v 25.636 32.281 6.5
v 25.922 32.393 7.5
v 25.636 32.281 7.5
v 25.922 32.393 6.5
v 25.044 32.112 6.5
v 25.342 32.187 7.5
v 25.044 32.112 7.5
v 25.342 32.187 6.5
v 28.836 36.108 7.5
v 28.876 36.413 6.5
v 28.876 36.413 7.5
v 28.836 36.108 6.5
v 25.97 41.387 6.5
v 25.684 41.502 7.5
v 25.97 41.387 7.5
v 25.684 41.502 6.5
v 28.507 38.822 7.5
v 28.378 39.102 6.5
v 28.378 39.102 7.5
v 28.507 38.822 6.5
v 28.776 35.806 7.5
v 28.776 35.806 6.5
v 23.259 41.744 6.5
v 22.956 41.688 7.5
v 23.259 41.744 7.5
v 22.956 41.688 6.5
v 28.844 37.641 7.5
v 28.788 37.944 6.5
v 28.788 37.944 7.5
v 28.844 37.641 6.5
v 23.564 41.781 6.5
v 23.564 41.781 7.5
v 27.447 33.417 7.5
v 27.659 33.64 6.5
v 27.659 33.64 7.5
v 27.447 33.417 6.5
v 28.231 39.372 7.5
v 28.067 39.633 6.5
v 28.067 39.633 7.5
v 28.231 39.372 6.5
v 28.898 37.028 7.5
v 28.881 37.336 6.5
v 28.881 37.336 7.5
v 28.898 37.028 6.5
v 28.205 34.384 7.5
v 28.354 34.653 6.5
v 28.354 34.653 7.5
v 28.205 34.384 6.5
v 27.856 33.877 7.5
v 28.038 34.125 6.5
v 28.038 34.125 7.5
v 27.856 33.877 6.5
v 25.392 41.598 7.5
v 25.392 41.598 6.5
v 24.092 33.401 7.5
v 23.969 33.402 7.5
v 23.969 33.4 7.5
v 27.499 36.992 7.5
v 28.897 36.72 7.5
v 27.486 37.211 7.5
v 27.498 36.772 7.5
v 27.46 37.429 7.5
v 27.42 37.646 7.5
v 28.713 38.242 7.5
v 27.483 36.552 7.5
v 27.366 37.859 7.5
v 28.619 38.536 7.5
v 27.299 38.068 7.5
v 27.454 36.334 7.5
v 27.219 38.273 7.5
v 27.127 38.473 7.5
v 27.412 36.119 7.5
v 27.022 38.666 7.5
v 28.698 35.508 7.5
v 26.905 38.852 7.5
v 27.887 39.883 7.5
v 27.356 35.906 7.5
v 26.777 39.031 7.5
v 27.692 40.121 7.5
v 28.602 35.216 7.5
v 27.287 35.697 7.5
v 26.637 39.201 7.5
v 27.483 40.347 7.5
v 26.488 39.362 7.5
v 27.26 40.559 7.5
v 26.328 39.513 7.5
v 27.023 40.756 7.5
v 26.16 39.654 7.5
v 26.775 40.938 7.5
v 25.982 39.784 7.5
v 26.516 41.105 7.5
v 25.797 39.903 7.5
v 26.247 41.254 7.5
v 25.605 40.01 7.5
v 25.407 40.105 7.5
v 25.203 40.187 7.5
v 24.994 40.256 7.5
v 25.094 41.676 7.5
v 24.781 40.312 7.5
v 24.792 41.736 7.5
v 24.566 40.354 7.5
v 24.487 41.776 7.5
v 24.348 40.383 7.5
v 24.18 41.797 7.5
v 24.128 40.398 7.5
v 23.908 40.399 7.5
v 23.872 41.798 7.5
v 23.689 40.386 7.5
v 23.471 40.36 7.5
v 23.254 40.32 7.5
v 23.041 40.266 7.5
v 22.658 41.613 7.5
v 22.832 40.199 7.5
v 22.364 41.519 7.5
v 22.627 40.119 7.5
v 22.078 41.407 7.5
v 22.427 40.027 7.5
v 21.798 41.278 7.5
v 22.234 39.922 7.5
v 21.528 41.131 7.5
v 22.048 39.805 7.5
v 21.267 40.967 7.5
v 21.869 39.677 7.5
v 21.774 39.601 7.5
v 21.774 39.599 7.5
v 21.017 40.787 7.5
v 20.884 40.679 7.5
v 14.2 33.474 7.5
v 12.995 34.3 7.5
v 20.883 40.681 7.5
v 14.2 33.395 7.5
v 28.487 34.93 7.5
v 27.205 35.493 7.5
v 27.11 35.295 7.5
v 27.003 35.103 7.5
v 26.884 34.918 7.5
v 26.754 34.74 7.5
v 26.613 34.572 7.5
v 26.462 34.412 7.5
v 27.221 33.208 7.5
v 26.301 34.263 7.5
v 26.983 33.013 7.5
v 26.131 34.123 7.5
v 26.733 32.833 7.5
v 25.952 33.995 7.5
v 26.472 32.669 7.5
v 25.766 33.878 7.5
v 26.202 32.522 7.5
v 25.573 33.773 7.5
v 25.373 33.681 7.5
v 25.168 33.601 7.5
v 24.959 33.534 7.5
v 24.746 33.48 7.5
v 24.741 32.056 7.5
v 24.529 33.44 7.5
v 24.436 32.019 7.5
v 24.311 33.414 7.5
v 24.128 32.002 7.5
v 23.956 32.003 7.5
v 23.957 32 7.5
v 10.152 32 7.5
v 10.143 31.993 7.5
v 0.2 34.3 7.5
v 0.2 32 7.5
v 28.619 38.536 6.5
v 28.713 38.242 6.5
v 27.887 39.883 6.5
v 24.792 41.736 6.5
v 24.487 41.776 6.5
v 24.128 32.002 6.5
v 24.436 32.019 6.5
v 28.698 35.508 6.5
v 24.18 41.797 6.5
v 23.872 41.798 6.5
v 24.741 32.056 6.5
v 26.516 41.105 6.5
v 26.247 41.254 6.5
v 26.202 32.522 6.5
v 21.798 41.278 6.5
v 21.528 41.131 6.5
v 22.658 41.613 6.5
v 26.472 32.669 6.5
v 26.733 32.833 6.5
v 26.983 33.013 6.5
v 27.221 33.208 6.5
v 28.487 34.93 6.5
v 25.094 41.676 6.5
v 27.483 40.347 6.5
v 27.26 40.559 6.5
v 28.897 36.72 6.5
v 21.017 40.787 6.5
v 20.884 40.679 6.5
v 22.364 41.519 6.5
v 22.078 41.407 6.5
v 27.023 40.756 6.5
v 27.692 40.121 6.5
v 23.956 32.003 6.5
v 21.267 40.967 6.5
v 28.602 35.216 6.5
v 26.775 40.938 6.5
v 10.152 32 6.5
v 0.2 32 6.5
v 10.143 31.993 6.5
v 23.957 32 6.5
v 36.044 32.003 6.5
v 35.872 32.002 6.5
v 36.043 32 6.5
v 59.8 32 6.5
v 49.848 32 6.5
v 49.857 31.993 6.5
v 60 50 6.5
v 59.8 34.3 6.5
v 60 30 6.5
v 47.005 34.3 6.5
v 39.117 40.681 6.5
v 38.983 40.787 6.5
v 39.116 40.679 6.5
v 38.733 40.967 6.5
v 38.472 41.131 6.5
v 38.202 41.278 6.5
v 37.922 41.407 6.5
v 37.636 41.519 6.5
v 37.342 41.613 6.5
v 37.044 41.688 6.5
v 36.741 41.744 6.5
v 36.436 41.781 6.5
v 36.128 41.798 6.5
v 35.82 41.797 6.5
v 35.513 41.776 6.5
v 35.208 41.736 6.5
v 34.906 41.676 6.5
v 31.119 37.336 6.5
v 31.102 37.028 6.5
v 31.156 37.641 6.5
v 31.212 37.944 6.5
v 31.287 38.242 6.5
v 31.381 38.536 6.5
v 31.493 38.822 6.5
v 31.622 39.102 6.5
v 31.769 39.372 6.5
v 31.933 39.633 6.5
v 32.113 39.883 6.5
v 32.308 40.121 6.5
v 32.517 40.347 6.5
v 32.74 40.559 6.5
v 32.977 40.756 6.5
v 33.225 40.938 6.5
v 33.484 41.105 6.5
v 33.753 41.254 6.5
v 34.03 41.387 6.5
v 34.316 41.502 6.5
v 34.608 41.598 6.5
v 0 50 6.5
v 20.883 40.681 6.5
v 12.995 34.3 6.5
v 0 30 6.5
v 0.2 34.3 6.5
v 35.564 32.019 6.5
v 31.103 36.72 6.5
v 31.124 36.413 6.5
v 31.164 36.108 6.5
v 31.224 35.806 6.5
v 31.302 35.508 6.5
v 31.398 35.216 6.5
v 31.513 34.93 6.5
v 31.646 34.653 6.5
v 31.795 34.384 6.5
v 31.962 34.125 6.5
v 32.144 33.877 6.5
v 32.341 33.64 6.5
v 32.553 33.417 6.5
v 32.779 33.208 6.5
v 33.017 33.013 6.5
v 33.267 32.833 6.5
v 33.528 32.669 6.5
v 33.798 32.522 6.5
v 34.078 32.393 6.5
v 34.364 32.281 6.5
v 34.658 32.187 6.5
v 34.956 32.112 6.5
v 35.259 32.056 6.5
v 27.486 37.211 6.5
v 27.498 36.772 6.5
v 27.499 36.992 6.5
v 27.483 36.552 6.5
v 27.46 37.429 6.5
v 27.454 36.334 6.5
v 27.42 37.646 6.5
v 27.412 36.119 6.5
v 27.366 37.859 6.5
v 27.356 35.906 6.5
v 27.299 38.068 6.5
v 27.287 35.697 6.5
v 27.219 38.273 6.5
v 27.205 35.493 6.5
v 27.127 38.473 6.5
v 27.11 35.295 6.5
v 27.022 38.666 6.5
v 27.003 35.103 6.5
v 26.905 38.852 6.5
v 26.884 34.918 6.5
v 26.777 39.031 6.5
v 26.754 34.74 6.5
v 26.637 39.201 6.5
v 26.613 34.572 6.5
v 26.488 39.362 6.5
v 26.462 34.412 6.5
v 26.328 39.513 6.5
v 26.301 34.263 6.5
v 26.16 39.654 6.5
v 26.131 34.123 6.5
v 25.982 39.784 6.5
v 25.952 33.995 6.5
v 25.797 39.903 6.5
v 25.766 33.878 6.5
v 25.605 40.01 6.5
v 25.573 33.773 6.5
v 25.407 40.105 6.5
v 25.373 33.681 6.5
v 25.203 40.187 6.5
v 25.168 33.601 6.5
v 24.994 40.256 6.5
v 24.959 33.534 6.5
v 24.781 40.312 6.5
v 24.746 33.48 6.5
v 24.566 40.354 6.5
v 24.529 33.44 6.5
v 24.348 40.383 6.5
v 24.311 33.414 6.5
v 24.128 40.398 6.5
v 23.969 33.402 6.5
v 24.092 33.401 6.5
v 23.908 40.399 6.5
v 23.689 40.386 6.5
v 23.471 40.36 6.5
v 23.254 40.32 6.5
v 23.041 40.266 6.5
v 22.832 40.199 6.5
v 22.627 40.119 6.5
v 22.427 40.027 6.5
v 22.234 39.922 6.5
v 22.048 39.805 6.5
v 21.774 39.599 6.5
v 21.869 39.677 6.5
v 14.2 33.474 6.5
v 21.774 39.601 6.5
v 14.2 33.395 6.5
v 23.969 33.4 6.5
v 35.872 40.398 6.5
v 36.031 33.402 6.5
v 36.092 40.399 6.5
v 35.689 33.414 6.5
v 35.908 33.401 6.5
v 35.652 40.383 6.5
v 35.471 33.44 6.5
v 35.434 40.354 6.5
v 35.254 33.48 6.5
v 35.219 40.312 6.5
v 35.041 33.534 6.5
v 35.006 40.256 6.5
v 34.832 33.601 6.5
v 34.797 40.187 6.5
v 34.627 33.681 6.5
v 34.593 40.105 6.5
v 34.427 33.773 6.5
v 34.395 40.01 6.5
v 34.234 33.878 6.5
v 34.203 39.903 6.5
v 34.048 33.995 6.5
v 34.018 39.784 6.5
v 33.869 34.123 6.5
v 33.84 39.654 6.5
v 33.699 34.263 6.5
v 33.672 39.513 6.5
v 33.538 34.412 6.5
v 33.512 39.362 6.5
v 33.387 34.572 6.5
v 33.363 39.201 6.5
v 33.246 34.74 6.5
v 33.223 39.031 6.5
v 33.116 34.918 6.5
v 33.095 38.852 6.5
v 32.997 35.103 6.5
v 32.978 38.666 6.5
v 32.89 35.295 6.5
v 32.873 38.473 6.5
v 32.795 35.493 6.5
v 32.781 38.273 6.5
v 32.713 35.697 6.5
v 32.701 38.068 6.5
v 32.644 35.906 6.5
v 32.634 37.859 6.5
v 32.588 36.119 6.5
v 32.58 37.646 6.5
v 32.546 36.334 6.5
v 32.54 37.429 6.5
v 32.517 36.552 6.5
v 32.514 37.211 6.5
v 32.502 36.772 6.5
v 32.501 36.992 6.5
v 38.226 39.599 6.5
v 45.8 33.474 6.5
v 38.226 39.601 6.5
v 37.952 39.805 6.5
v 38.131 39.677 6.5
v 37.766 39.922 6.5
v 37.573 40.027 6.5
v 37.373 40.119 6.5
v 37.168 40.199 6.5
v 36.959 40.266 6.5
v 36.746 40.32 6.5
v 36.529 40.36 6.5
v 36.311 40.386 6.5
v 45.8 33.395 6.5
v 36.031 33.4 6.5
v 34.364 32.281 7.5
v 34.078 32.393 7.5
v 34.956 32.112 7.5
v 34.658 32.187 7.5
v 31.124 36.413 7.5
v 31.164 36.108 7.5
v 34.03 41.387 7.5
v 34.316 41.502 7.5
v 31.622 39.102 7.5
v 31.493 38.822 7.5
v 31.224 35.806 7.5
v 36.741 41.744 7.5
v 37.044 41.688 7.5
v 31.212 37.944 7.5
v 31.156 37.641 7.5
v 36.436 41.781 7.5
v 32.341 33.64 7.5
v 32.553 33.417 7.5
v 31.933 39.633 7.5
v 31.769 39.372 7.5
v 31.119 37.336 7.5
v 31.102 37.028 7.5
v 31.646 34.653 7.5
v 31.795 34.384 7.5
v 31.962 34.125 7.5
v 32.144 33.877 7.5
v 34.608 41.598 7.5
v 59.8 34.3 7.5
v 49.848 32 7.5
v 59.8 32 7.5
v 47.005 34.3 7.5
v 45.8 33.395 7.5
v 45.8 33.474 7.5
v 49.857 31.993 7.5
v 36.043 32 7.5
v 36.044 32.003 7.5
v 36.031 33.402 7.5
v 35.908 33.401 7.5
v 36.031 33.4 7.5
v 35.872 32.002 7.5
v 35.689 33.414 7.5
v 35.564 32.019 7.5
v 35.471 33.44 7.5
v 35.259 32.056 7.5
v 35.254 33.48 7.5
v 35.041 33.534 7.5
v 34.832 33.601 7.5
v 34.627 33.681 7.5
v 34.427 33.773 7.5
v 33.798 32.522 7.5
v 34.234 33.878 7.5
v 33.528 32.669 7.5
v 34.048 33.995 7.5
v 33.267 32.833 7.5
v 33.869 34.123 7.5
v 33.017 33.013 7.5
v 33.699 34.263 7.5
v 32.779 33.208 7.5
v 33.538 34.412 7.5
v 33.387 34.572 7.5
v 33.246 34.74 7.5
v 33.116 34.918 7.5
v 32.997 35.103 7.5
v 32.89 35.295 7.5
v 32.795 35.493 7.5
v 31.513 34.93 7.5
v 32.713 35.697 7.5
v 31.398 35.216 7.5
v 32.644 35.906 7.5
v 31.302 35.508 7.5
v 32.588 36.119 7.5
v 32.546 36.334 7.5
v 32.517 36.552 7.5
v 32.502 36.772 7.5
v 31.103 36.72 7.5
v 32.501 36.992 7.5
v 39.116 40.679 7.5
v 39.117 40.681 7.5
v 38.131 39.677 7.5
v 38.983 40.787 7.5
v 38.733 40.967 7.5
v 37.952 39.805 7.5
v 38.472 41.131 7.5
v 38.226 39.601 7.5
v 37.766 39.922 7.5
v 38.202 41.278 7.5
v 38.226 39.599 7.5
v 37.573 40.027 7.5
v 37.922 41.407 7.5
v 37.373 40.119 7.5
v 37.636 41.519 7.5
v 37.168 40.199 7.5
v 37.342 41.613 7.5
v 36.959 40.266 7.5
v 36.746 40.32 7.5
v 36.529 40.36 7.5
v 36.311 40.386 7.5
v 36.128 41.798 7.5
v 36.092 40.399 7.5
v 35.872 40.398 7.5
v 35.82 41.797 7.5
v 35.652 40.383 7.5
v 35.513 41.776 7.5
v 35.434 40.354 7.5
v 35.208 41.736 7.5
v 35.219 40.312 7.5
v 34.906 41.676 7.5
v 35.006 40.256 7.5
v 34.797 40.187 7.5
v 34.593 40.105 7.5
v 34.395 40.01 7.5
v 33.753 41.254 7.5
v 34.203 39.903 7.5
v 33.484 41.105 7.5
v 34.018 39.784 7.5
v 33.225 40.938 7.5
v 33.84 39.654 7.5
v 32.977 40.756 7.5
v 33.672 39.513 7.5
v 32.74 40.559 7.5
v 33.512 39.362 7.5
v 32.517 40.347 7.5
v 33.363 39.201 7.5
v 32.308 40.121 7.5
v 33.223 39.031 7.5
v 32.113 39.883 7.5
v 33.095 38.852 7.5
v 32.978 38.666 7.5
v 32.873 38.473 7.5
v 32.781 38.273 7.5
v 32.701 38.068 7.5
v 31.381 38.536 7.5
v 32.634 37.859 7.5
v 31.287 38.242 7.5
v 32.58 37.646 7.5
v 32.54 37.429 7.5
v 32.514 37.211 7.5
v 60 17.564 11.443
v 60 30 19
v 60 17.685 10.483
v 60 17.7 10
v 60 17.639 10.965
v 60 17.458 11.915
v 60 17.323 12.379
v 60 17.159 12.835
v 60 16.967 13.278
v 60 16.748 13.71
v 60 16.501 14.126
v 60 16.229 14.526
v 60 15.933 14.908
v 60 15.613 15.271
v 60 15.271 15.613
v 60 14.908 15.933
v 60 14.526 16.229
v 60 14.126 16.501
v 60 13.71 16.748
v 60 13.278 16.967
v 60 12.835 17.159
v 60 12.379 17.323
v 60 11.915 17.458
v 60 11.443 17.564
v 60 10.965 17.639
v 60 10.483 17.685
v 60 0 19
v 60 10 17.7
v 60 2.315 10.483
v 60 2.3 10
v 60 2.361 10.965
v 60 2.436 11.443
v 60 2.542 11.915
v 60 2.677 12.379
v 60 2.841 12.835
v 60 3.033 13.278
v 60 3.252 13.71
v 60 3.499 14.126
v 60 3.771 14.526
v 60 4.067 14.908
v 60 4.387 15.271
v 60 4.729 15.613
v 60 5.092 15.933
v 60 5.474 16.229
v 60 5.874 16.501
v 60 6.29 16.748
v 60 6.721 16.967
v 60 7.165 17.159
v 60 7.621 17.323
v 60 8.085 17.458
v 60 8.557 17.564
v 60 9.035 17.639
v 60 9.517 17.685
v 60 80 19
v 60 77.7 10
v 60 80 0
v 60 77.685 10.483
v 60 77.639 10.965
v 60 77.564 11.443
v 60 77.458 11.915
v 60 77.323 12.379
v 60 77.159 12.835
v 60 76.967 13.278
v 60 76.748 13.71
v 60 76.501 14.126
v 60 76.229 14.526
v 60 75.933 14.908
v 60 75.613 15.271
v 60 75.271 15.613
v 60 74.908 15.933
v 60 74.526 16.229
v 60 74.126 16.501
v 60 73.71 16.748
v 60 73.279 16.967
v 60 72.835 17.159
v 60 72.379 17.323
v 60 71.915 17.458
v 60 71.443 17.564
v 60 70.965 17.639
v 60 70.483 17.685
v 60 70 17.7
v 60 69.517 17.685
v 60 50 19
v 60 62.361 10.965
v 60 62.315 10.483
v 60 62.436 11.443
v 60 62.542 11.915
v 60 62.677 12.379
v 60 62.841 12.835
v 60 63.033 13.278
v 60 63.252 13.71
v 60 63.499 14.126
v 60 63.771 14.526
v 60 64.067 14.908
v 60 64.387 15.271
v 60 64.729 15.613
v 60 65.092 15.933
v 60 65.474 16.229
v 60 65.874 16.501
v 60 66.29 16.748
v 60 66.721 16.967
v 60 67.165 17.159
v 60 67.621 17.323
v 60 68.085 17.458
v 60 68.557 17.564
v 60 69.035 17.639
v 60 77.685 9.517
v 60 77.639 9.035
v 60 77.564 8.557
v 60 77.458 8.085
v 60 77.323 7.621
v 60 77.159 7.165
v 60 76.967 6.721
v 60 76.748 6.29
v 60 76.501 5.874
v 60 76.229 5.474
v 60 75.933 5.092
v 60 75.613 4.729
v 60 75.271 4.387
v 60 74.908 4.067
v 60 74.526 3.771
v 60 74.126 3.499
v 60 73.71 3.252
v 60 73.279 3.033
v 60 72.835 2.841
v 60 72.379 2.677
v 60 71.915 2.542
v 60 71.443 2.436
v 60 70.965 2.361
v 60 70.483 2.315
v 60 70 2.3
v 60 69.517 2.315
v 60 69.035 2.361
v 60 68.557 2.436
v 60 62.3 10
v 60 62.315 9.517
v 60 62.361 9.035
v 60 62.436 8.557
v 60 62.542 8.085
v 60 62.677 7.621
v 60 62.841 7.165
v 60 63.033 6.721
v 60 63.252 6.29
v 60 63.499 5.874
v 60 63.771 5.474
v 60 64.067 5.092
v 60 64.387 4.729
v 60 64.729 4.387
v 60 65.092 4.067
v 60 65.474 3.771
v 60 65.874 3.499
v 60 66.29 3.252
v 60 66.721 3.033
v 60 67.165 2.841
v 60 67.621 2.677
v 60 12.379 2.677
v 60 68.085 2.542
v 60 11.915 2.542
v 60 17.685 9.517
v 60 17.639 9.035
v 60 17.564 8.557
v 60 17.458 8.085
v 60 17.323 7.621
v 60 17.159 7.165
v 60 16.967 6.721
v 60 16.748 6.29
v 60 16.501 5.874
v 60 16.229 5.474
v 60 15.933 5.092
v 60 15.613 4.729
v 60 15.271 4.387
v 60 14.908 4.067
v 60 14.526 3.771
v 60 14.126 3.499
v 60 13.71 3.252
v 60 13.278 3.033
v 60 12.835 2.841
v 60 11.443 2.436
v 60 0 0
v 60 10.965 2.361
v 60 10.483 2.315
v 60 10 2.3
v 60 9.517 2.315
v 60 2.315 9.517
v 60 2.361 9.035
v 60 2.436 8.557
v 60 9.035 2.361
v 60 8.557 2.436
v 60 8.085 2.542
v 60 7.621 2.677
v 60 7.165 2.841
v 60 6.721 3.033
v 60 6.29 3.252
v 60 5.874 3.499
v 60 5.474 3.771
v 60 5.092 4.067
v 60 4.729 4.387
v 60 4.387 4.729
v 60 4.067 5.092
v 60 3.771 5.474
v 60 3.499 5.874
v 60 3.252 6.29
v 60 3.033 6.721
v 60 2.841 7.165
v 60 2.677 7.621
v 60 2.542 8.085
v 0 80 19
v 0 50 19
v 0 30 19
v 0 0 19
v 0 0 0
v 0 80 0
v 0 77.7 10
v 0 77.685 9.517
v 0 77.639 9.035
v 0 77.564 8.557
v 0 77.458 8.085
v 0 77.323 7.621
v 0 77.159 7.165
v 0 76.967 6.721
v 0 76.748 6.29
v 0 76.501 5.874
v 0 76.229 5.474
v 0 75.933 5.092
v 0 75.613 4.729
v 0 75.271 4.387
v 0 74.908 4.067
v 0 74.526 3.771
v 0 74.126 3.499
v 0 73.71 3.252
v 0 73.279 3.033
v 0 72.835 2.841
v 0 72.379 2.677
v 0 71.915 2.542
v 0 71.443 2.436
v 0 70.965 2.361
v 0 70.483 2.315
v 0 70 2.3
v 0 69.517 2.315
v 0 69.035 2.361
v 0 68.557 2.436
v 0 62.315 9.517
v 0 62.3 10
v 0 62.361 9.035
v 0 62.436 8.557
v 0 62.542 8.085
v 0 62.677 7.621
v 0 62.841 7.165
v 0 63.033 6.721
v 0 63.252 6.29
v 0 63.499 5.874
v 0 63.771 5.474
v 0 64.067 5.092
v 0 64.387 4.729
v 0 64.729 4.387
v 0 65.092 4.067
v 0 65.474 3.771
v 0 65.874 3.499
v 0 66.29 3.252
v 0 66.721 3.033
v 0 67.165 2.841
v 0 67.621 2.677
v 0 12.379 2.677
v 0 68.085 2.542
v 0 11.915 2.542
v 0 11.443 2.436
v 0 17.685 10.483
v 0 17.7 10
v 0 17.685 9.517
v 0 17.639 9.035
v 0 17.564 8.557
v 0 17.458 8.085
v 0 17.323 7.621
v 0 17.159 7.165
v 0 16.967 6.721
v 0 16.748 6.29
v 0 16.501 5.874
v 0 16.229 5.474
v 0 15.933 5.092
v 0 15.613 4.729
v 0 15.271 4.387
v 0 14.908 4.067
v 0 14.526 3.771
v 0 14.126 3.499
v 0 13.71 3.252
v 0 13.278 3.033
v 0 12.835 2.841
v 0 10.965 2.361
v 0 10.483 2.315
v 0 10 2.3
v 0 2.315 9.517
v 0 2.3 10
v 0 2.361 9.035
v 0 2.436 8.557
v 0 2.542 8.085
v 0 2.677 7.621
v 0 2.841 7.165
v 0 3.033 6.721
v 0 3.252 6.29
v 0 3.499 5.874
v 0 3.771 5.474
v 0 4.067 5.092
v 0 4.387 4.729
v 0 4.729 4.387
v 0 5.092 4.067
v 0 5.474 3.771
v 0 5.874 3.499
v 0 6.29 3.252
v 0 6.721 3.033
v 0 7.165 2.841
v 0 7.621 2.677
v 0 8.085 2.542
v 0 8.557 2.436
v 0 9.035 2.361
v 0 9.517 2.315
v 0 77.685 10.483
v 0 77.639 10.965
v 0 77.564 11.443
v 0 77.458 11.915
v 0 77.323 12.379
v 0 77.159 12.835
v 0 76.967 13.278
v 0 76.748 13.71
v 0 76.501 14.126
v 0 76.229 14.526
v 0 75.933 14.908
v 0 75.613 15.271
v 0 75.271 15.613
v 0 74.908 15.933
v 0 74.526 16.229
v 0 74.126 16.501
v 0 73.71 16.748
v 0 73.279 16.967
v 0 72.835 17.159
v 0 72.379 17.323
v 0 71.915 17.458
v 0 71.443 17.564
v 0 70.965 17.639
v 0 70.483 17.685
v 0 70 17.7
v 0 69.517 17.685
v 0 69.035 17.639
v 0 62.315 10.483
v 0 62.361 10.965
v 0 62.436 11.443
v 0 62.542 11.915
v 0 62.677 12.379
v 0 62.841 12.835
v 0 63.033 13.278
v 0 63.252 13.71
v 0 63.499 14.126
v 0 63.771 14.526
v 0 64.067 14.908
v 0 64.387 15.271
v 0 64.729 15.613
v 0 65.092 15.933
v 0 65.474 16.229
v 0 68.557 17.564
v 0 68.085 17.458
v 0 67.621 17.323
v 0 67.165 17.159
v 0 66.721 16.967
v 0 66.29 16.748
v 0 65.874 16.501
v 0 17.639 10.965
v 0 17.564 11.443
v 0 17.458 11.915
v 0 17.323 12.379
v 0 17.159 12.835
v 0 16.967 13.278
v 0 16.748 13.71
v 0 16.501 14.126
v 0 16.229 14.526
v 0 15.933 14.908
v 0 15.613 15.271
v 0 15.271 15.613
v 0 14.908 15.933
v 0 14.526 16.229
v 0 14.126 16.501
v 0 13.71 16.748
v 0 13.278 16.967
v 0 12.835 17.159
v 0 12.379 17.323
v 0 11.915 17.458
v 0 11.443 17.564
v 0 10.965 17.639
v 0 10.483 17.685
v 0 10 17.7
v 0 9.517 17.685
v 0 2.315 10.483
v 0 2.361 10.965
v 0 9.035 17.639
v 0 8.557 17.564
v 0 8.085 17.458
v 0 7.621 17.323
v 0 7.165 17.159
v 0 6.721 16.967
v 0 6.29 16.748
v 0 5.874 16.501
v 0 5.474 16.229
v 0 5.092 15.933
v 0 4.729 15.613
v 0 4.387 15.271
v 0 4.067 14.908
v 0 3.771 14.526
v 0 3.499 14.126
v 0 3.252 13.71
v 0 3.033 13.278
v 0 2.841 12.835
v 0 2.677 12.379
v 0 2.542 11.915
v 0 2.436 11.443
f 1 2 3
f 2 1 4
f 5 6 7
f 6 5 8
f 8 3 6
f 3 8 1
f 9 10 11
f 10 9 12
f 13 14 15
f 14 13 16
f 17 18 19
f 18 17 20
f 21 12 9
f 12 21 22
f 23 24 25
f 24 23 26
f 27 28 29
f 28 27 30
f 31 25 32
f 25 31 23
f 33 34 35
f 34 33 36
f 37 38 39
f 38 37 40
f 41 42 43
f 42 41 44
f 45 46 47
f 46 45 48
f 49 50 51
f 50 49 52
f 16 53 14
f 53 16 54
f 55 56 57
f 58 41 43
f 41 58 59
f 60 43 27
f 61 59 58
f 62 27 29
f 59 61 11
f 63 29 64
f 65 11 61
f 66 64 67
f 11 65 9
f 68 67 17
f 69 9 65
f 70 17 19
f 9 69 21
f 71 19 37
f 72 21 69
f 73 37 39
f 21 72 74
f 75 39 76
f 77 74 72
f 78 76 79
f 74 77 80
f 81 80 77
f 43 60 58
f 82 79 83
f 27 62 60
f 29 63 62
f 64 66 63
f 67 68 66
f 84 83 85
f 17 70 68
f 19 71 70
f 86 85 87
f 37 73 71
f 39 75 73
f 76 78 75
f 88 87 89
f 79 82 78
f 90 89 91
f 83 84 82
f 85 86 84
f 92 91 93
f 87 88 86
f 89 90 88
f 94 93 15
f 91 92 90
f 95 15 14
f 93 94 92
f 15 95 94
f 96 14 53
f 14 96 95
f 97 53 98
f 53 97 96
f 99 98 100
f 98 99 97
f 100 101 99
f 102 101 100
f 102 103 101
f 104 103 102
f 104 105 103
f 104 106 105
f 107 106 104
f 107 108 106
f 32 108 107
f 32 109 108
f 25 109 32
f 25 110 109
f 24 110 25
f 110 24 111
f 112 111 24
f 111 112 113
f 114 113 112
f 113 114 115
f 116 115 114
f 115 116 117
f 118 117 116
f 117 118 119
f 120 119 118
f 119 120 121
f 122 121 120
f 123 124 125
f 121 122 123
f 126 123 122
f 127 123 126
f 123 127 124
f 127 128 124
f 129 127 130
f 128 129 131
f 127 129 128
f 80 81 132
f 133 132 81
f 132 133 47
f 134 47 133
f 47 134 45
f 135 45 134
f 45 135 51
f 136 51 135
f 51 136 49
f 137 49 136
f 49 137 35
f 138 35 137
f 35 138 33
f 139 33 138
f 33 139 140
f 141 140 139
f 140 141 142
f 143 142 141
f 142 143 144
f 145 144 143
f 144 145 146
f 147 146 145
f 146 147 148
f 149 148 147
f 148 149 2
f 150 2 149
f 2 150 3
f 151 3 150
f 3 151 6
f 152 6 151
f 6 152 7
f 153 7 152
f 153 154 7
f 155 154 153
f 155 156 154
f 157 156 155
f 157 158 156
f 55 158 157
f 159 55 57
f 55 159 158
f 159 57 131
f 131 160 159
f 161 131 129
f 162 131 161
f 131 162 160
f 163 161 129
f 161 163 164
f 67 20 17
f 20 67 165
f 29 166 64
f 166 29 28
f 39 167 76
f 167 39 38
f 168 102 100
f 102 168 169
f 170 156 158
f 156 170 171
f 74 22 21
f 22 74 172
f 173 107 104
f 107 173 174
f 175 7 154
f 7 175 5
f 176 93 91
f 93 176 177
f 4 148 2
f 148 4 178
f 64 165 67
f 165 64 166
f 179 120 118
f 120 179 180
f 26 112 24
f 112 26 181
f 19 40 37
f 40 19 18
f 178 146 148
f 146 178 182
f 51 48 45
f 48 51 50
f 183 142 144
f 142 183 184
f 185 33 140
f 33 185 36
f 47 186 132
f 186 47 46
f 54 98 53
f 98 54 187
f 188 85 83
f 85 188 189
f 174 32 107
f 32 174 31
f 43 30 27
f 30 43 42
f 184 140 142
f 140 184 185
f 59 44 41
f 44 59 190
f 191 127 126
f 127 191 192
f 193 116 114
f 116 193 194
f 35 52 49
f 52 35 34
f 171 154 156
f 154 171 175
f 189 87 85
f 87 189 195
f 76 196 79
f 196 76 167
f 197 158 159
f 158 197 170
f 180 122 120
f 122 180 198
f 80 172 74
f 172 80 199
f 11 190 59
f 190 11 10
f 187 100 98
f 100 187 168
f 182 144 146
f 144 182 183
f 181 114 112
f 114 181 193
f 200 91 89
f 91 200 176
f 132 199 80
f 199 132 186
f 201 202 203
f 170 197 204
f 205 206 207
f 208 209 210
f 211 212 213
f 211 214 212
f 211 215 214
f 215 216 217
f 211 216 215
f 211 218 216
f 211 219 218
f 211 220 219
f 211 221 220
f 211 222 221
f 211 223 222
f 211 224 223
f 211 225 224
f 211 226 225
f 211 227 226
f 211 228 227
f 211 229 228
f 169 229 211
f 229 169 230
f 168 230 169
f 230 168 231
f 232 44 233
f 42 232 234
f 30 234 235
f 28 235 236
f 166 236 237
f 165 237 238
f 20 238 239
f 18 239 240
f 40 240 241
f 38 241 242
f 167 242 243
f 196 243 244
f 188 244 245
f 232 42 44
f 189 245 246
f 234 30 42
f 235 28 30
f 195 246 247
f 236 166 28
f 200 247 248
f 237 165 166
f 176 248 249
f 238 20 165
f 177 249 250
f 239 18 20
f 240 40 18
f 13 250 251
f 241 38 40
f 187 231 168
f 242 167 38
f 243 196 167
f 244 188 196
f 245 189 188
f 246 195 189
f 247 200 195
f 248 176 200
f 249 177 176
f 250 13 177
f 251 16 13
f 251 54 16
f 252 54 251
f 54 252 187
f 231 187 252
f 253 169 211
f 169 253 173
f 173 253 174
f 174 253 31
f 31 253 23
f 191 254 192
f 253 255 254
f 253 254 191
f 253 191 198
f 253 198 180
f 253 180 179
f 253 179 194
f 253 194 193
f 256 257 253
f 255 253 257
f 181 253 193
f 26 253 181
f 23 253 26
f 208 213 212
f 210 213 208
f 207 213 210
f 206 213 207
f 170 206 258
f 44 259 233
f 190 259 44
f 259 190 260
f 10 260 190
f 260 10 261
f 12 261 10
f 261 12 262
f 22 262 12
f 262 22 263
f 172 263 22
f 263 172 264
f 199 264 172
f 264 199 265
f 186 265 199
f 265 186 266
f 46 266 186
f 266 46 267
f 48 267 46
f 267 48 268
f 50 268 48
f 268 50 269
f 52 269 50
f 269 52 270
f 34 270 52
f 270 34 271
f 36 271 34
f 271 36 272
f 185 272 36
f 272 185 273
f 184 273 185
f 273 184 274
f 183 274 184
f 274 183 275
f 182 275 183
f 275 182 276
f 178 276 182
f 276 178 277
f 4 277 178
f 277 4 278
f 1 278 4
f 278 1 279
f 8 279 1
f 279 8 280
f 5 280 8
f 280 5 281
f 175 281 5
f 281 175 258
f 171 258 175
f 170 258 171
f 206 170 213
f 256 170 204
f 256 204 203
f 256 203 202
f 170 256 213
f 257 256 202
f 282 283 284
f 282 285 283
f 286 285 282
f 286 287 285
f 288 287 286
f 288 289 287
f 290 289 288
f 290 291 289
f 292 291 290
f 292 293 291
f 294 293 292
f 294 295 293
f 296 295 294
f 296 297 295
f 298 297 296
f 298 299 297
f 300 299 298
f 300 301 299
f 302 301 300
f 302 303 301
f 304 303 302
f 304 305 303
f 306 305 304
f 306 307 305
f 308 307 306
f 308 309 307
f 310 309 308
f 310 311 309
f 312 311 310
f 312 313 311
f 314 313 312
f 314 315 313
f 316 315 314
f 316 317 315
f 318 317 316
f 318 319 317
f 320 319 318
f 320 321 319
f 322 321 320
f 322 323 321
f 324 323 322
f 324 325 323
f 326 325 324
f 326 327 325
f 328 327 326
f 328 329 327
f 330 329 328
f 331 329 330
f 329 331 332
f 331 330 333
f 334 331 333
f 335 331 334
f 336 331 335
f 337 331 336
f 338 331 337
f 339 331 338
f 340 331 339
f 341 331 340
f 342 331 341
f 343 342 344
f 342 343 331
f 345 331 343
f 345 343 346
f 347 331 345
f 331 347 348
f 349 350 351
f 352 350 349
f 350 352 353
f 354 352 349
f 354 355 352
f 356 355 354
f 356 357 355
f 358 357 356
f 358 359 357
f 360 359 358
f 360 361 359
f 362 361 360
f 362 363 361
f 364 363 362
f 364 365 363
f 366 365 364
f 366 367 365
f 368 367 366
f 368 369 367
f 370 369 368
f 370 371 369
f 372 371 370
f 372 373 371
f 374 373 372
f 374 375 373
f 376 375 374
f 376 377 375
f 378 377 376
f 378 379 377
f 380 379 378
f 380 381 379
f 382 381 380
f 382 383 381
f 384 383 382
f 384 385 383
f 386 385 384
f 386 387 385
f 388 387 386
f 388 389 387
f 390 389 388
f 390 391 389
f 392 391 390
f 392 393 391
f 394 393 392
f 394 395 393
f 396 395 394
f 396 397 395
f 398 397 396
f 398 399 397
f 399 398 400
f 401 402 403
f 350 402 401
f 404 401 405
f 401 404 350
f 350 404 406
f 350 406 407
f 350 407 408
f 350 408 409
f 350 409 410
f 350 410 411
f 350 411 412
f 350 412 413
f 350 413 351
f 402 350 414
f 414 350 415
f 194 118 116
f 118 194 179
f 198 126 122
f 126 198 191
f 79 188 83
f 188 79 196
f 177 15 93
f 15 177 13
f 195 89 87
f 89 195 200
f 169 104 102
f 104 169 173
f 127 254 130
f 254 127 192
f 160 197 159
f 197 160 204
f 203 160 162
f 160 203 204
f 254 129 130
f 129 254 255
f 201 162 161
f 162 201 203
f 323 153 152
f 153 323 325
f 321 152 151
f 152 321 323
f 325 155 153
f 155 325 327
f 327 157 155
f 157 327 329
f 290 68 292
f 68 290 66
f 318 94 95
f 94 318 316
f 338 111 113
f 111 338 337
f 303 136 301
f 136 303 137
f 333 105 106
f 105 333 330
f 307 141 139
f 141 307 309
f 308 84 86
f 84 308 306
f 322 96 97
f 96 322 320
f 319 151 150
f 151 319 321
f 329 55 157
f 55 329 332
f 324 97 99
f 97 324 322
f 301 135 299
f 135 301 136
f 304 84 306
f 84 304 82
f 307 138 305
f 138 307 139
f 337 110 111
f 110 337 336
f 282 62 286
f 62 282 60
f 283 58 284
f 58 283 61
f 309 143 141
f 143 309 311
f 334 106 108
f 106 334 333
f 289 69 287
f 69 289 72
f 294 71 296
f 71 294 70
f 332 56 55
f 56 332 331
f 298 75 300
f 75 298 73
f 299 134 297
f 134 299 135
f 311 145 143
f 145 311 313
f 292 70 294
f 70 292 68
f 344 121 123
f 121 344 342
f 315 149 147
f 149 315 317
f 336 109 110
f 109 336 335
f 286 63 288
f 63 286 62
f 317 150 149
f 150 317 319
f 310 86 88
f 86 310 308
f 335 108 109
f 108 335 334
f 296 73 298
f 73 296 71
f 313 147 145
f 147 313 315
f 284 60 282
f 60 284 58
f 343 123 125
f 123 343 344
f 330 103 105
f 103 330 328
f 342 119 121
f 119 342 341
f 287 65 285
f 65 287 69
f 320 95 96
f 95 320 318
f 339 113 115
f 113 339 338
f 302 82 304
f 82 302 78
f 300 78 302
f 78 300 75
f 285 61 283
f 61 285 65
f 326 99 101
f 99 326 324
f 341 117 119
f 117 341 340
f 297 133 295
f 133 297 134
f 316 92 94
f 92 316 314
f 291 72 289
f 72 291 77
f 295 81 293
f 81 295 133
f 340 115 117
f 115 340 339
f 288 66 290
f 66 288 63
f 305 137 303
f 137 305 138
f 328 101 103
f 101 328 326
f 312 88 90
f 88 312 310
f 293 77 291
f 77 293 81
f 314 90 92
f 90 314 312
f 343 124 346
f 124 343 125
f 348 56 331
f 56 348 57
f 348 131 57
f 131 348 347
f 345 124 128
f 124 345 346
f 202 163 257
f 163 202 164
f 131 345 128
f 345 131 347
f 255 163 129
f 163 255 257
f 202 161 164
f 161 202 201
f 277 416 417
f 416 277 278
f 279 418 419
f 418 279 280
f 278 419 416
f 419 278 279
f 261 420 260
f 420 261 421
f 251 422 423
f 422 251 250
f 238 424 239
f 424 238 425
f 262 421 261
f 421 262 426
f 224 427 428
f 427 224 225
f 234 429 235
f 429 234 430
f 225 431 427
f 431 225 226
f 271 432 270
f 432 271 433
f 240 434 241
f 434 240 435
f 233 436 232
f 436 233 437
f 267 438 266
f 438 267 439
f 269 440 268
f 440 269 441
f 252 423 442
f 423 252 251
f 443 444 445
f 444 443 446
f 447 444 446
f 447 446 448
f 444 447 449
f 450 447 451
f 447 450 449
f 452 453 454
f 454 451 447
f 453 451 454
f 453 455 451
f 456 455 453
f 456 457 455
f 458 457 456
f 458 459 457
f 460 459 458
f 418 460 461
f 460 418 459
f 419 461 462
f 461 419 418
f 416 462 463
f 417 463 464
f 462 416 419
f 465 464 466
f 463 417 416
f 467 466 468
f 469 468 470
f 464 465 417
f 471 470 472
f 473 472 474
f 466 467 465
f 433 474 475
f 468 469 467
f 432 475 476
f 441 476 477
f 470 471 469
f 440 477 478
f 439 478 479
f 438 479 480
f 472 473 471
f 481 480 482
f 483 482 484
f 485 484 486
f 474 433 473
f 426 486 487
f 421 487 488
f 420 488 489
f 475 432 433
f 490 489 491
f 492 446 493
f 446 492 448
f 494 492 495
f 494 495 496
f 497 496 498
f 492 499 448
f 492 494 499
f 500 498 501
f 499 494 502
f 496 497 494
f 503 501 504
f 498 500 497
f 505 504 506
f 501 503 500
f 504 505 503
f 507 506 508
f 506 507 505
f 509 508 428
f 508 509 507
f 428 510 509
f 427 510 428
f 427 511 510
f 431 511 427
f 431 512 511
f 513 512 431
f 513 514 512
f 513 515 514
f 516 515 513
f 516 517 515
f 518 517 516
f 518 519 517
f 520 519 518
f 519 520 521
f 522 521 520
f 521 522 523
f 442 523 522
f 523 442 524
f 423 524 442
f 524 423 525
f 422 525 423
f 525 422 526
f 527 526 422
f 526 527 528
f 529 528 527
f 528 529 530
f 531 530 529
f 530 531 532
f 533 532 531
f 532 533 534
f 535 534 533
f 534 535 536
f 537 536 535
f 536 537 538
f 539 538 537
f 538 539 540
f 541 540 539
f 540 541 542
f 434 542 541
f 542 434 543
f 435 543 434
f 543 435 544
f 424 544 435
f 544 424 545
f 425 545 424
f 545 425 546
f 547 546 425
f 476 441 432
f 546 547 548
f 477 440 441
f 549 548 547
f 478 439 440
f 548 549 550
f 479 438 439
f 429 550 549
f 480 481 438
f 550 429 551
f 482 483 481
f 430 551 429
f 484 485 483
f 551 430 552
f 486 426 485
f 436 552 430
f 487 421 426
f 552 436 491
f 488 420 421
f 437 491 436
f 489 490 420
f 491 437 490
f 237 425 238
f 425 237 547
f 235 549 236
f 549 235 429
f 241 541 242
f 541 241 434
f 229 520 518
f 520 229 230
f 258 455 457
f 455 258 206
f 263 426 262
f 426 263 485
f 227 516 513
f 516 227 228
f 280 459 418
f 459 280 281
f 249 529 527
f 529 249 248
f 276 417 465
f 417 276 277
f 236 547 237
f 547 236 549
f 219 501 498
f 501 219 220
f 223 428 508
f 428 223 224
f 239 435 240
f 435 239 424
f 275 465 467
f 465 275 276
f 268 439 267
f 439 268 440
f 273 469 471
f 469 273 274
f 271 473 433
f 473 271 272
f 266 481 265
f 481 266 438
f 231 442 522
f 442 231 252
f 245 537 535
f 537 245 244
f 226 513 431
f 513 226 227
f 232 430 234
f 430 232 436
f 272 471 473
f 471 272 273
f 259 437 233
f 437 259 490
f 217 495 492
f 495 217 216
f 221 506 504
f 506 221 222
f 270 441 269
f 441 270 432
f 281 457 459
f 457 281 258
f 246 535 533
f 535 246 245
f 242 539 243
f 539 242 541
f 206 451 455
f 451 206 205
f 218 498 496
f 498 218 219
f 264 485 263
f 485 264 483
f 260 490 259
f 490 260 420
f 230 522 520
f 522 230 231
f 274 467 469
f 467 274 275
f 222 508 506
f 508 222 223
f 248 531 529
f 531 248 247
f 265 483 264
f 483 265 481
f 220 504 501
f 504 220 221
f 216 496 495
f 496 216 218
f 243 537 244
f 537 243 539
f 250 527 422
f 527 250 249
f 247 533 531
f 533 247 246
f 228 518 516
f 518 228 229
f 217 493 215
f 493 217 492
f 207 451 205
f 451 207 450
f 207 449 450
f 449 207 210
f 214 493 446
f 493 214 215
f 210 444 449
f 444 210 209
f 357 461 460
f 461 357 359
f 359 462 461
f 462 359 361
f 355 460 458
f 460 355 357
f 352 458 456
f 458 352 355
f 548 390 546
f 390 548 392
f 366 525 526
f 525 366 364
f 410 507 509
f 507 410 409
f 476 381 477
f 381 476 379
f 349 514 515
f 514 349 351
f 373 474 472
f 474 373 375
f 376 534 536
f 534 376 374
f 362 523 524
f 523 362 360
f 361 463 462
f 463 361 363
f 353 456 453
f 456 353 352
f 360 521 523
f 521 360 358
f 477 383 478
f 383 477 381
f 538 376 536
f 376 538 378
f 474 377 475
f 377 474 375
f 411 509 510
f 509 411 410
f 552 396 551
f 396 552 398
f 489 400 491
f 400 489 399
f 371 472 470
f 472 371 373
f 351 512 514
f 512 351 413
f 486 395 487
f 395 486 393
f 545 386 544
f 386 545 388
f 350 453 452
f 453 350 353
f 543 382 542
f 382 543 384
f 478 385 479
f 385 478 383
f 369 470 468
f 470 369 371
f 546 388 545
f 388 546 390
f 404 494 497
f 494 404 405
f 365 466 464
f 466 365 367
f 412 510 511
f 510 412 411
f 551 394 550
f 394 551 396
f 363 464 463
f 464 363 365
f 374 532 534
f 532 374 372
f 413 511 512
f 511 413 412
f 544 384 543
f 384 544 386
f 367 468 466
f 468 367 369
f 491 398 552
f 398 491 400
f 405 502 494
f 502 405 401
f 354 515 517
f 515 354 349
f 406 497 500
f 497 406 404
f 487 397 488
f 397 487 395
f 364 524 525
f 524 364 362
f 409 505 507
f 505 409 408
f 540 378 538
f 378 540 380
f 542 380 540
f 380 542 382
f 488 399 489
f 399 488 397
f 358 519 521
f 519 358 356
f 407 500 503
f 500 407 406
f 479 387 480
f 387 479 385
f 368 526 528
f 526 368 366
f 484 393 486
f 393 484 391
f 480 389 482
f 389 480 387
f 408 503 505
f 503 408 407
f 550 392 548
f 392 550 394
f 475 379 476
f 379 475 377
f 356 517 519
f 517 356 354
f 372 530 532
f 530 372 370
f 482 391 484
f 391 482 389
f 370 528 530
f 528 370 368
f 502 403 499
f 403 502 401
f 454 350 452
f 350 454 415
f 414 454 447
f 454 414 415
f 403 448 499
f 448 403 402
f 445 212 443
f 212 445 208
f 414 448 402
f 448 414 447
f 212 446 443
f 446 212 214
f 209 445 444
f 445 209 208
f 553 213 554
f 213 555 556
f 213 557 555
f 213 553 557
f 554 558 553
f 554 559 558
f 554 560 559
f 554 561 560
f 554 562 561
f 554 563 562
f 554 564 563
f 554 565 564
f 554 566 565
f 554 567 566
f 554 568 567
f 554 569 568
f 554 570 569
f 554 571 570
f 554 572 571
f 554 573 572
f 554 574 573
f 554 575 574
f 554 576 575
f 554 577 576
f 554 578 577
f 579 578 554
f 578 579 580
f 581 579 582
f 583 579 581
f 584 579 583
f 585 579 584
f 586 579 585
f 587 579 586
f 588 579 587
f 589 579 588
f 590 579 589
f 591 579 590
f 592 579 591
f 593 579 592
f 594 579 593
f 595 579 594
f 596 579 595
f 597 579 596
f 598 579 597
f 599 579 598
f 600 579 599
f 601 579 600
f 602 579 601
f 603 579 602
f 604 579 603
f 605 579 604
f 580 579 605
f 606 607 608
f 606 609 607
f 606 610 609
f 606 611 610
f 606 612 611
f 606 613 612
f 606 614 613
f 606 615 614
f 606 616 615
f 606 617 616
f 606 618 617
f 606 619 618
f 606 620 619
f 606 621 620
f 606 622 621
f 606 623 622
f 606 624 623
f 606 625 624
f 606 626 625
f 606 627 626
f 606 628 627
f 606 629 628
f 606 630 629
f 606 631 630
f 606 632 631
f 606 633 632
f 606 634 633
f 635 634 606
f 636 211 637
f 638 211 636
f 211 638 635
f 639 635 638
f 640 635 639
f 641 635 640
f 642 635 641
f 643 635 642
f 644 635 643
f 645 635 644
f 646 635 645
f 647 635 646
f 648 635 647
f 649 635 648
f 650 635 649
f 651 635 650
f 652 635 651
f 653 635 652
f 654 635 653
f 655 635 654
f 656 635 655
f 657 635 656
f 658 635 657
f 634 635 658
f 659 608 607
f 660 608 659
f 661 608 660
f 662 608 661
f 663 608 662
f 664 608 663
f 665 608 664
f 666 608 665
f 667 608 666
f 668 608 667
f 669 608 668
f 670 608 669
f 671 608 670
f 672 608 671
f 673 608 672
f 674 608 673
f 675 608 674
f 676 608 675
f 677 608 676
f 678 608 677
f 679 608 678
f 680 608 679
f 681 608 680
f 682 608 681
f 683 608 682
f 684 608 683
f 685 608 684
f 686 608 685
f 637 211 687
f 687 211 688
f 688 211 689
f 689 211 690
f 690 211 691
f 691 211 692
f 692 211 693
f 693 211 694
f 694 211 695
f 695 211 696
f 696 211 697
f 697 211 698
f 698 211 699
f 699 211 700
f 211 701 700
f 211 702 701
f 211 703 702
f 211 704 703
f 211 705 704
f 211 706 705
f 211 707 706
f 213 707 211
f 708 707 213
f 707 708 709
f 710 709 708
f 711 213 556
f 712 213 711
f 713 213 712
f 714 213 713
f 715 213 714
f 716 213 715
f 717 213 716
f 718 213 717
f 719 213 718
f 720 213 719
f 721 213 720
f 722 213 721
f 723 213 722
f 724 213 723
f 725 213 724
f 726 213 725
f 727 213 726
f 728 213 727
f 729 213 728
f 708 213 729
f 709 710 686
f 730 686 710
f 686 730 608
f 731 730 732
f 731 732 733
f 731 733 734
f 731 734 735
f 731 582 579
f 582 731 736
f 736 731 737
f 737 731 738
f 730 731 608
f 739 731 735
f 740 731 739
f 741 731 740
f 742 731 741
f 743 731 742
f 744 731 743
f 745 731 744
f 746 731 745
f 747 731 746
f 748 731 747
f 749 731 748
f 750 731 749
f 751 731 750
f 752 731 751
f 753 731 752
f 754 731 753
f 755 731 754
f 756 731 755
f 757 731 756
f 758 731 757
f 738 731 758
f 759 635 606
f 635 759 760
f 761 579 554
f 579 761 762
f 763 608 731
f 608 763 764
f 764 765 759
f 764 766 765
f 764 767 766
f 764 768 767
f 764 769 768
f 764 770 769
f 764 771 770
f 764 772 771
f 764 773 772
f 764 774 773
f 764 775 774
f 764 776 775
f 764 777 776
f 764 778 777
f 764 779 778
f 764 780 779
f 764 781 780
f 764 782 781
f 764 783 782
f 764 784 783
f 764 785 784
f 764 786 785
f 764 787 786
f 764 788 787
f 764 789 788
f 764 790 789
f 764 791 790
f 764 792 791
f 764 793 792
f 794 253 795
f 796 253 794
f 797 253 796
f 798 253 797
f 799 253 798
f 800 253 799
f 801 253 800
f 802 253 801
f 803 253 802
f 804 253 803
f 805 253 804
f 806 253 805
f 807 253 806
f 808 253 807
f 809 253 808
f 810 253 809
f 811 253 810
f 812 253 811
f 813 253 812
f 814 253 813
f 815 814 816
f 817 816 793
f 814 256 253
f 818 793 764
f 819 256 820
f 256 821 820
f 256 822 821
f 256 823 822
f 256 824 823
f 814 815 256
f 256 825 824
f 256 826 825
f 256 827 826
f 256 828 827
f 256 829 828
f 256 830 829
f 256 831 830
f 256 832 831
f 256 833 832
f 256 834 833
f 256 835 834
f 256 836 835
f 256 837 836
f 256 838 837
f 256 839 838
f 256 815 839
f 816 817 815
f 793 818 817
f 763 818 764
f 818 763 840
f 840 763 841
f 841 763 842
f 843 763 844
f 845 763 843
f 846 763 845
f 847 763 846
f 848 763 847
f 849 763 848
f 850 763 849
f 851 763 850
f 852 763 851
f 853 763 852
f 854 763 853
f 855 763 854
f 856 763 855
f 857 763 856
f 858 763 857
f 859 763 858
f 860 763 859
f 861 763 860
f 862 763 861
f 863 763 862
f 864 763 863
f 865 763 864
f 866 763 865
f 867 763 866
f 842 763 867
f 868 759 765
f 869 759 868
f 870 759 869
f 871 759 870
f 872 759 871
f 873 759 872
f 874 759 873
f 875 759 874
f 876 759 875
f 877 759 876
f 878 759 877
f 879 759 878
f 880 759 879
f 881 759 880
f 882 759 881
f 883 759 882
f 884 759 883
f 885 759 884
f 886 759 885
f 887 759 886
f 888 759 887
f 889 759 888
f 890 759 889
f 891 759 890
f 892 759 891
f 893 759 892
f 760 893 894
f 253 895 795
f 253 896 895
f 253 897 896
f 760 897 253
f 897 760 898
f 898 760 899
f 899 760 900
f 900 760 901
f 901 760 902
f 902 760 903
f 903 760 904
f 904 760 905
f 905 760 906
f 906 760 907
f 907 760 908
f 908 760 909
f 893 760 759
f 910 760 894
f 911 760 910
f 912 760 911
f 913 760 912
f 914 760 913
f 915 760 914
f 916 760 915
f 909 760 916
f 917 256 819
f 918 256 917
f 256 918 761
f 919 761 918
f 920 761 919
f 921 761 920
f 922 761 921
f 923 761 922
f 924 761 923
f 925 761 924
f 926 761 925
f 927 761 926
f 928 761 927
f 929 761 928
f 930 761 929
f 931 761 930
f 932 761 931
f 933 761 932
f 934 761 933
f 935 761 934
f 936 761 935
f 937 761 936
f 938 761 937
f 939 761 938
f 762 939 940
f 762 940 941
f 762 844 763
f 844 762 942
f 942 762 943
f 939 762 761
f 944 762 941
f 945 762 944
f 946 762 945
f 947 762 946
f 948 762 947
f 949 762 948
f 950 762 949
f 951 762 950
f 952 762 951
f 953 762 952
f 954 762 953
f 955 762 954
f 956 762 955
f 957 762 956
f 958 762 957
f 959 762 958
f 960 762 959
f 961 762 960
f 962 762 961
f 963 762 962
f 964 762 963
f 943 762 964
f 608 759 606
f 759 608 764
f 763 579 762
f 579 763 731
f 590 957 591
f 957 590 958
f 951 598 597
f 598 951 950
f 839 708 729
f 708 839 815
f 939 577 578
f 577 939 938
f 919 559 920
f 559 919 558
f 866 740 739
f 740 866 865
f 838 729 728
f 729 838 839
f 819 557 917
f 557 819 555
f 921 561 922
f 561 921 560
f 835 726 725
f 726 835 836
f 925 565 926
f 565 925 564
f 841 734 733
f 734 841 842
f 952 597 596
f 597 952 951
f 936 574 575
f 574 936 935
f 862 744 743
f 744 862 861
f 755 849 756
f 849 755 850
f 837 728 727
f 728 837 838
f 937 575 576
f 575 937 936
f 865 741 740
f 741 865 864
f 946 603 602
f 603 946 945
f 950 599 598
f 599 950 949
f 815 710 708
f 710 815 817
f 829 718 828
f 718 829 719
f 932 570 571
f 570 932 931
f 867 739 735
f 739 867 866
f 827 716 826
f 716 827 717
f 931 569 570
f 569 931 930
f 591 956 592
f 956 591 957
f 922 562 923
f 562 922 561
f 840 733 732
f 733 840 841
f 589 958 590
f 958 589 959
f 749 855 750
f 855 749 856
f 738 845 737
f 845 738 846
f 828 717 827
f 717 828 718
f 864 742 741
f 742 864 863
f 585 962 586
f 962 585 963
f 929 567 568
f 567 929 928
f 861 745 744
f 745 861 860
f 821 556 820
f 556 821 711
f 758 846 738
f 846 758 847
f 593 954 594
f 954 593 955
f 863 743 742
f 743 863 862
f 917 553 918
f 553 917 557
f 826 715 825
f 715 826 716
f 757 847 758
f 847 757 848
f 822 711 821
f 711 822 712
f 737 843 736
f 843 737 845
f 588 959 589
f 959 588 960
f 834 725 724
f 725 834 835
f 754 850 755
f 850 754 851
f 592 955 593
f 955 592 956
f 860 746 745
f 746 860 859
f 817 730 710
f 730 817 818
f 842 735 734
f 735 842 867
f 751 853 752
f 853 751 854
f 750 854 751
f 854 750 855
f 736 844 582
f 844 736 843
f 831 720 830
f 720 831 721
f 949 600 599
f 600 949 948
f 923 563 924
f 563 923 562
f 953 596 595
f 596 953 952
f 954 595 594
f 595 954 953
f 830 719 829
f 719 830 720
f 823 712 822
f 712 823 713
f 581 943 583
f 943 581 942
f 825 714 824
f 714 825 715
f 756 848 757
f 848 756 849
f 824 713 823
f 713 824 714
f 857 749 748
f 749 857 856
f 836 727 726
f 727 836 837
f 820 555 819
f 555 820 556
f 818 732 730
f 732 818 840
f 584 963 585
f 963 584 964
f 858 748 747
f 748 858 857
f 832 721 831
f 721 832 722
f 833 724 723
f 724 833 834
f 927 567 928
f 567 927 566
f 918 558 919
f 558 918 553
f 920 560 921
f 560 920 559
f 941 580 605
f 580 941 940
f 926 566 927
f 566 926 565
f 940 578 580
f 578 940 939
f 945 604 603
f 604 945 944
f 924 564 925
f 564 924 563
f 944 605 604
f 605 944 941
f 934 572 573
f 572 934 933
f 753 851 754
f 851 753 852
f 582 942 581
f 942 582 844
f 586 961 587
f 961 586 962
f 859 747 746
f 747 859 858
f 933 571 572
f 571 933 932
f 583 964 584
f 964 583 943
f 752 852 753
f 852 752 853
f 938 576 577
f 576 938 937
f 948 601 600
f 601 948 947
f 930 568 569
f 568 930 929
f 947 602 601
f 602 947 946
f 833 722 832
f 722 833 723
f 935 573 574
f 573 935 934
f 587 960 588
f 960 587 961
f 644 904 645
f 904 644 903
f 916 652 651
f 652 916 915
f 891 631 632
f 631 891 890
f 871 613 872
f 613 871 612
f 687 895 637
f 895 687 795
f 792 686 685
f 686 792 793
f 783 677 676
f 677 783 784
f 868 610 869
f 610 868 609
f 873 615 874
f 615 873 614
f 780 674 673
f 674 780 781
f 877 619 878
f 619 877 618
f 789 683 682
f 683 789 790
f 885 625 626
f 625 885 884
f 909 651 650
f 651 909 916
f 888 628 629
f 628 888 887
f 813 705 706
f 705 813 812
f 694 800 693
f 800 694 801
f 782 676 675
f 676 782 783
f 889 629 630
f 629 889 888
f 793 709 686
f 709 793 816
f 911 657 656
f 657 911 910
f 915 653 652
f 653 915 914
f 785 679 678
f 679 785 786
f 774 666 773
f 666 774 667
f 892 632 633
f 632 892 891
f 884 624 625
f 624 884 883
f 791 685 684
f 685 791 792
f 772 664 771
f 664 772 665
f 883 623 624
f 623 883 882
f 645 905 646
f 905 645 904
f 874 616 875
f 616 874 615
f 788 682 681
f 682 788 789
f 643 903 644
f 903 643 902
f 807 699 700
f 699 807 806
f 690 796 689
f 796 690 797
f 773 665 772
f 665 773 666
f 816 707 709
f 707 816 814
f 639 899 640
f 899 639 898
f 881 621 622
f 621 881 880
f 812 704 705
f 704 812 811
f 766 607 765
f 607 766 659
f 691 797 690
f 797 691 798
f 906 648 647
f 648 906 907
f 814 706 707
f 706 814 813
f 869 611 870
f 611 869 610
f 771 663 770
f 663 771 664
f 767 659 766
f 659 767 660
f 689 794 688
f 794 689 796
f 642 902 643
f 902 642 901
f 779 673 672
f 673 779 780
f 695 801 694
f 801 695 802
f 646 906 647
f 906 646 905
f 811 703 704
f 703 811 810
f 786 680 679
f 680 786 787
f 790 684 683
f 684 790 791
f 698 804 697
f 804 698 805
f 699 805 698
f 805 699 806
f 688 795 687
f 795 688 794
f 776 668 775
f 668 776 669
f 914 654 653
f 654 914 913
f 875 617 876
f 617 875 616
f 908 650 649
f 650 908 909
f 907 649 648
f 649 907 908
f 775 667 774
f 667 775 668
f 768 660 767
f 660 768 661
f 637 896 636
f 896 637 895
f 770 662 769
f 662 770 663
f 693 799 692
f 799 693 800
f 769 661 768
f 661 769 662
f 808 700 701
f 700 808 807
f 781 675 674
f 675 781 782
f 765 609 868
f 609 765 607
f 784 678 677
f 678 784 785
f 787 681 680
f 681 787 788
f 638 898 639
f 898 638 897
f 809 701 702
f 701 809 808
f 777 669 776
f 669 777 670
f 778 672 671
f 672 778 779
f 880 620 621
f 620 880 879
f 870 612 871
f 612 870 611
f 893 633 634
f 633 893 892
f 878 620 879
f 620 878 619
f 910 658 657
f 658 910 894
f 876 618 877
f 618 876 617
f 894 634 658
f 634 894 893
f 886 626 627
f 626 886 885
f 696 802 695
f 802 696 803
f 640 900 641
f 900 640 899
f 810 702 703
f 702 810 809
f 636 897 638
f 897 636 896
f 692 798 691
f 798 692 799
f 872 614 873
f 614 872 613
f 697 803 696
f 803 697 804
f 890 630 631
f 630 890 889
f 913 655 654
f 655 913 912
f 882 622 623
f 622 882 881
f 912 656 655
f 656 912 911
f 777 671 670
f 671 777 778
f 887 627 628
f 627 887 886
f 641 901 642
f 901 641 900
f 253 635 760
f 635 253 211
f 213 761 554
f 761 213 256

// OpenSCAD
l=80;
w=60;
h=19;
hh=6.5;
s_w=20;
br=7.7;

rr=4.9;
d_in=1.4;
dd_in=2.3;
//h=12.5;
h_s=1;
//w_s=14;
$fn=100;

module raindrop2D(thick, radius, centered = true){
	if(!centered){
		translate([radius, radius, 0]){
			cylinder(h = thick, r = radius);
			linear_extrude(height = thick)
			polygon(points=[[radius * -cos(20), radius * sin(20)],[radius * cos(20), radius * sin(20)],[0, radius * 3]], paths=[[0,1,2]]);
		}
	}else if(centered){
		cylinder(h = thick, r = radius);
		linear_extrude(height = thick)
		polygon(points=[[radius * -cos(20), radius * sin(20)],[radius * cos(20), radius * sin(20)],[0, radius * 3]], paths=[[0,1,2]]);
	}	
}


module belt_support(){
    translate([0,rr,0])rotate([0,0,-109.5])difference(){
        raindrop2D(thick=h_s, radius=rr);
        raindrop2D(thick=h_s, radius=rr-d_in);
    }
    translate([rr*2,0,0])cube([14,dd_in,h_s]);
     //translate()linear_extrude(height = h)polygon ( points= [ [0,r], [2*r,0], [0,-r]]); 
    }
module support(){
        translate([24,2,hh])mirror([-1,0,0])belt_support();
        translate([36,2,hh])belt_support();
    }



module cariage(){
    difference(){
            cube([w,l,h]);
            translate([0,30,0])support();
        translate([0,10,10])rotate([0,90])cylinder(r=br,h=w*2,$fn=100);
        translate([0,l-10,10])rotate([0,90])cylinder(r=br,h=w*2,$fn=100);
        translate([0,(l-s_w)/2,hh])cube([w,s_w,hh*2]);
        }
        translate([0,30,0])support();
    }

cariage();
//support();
